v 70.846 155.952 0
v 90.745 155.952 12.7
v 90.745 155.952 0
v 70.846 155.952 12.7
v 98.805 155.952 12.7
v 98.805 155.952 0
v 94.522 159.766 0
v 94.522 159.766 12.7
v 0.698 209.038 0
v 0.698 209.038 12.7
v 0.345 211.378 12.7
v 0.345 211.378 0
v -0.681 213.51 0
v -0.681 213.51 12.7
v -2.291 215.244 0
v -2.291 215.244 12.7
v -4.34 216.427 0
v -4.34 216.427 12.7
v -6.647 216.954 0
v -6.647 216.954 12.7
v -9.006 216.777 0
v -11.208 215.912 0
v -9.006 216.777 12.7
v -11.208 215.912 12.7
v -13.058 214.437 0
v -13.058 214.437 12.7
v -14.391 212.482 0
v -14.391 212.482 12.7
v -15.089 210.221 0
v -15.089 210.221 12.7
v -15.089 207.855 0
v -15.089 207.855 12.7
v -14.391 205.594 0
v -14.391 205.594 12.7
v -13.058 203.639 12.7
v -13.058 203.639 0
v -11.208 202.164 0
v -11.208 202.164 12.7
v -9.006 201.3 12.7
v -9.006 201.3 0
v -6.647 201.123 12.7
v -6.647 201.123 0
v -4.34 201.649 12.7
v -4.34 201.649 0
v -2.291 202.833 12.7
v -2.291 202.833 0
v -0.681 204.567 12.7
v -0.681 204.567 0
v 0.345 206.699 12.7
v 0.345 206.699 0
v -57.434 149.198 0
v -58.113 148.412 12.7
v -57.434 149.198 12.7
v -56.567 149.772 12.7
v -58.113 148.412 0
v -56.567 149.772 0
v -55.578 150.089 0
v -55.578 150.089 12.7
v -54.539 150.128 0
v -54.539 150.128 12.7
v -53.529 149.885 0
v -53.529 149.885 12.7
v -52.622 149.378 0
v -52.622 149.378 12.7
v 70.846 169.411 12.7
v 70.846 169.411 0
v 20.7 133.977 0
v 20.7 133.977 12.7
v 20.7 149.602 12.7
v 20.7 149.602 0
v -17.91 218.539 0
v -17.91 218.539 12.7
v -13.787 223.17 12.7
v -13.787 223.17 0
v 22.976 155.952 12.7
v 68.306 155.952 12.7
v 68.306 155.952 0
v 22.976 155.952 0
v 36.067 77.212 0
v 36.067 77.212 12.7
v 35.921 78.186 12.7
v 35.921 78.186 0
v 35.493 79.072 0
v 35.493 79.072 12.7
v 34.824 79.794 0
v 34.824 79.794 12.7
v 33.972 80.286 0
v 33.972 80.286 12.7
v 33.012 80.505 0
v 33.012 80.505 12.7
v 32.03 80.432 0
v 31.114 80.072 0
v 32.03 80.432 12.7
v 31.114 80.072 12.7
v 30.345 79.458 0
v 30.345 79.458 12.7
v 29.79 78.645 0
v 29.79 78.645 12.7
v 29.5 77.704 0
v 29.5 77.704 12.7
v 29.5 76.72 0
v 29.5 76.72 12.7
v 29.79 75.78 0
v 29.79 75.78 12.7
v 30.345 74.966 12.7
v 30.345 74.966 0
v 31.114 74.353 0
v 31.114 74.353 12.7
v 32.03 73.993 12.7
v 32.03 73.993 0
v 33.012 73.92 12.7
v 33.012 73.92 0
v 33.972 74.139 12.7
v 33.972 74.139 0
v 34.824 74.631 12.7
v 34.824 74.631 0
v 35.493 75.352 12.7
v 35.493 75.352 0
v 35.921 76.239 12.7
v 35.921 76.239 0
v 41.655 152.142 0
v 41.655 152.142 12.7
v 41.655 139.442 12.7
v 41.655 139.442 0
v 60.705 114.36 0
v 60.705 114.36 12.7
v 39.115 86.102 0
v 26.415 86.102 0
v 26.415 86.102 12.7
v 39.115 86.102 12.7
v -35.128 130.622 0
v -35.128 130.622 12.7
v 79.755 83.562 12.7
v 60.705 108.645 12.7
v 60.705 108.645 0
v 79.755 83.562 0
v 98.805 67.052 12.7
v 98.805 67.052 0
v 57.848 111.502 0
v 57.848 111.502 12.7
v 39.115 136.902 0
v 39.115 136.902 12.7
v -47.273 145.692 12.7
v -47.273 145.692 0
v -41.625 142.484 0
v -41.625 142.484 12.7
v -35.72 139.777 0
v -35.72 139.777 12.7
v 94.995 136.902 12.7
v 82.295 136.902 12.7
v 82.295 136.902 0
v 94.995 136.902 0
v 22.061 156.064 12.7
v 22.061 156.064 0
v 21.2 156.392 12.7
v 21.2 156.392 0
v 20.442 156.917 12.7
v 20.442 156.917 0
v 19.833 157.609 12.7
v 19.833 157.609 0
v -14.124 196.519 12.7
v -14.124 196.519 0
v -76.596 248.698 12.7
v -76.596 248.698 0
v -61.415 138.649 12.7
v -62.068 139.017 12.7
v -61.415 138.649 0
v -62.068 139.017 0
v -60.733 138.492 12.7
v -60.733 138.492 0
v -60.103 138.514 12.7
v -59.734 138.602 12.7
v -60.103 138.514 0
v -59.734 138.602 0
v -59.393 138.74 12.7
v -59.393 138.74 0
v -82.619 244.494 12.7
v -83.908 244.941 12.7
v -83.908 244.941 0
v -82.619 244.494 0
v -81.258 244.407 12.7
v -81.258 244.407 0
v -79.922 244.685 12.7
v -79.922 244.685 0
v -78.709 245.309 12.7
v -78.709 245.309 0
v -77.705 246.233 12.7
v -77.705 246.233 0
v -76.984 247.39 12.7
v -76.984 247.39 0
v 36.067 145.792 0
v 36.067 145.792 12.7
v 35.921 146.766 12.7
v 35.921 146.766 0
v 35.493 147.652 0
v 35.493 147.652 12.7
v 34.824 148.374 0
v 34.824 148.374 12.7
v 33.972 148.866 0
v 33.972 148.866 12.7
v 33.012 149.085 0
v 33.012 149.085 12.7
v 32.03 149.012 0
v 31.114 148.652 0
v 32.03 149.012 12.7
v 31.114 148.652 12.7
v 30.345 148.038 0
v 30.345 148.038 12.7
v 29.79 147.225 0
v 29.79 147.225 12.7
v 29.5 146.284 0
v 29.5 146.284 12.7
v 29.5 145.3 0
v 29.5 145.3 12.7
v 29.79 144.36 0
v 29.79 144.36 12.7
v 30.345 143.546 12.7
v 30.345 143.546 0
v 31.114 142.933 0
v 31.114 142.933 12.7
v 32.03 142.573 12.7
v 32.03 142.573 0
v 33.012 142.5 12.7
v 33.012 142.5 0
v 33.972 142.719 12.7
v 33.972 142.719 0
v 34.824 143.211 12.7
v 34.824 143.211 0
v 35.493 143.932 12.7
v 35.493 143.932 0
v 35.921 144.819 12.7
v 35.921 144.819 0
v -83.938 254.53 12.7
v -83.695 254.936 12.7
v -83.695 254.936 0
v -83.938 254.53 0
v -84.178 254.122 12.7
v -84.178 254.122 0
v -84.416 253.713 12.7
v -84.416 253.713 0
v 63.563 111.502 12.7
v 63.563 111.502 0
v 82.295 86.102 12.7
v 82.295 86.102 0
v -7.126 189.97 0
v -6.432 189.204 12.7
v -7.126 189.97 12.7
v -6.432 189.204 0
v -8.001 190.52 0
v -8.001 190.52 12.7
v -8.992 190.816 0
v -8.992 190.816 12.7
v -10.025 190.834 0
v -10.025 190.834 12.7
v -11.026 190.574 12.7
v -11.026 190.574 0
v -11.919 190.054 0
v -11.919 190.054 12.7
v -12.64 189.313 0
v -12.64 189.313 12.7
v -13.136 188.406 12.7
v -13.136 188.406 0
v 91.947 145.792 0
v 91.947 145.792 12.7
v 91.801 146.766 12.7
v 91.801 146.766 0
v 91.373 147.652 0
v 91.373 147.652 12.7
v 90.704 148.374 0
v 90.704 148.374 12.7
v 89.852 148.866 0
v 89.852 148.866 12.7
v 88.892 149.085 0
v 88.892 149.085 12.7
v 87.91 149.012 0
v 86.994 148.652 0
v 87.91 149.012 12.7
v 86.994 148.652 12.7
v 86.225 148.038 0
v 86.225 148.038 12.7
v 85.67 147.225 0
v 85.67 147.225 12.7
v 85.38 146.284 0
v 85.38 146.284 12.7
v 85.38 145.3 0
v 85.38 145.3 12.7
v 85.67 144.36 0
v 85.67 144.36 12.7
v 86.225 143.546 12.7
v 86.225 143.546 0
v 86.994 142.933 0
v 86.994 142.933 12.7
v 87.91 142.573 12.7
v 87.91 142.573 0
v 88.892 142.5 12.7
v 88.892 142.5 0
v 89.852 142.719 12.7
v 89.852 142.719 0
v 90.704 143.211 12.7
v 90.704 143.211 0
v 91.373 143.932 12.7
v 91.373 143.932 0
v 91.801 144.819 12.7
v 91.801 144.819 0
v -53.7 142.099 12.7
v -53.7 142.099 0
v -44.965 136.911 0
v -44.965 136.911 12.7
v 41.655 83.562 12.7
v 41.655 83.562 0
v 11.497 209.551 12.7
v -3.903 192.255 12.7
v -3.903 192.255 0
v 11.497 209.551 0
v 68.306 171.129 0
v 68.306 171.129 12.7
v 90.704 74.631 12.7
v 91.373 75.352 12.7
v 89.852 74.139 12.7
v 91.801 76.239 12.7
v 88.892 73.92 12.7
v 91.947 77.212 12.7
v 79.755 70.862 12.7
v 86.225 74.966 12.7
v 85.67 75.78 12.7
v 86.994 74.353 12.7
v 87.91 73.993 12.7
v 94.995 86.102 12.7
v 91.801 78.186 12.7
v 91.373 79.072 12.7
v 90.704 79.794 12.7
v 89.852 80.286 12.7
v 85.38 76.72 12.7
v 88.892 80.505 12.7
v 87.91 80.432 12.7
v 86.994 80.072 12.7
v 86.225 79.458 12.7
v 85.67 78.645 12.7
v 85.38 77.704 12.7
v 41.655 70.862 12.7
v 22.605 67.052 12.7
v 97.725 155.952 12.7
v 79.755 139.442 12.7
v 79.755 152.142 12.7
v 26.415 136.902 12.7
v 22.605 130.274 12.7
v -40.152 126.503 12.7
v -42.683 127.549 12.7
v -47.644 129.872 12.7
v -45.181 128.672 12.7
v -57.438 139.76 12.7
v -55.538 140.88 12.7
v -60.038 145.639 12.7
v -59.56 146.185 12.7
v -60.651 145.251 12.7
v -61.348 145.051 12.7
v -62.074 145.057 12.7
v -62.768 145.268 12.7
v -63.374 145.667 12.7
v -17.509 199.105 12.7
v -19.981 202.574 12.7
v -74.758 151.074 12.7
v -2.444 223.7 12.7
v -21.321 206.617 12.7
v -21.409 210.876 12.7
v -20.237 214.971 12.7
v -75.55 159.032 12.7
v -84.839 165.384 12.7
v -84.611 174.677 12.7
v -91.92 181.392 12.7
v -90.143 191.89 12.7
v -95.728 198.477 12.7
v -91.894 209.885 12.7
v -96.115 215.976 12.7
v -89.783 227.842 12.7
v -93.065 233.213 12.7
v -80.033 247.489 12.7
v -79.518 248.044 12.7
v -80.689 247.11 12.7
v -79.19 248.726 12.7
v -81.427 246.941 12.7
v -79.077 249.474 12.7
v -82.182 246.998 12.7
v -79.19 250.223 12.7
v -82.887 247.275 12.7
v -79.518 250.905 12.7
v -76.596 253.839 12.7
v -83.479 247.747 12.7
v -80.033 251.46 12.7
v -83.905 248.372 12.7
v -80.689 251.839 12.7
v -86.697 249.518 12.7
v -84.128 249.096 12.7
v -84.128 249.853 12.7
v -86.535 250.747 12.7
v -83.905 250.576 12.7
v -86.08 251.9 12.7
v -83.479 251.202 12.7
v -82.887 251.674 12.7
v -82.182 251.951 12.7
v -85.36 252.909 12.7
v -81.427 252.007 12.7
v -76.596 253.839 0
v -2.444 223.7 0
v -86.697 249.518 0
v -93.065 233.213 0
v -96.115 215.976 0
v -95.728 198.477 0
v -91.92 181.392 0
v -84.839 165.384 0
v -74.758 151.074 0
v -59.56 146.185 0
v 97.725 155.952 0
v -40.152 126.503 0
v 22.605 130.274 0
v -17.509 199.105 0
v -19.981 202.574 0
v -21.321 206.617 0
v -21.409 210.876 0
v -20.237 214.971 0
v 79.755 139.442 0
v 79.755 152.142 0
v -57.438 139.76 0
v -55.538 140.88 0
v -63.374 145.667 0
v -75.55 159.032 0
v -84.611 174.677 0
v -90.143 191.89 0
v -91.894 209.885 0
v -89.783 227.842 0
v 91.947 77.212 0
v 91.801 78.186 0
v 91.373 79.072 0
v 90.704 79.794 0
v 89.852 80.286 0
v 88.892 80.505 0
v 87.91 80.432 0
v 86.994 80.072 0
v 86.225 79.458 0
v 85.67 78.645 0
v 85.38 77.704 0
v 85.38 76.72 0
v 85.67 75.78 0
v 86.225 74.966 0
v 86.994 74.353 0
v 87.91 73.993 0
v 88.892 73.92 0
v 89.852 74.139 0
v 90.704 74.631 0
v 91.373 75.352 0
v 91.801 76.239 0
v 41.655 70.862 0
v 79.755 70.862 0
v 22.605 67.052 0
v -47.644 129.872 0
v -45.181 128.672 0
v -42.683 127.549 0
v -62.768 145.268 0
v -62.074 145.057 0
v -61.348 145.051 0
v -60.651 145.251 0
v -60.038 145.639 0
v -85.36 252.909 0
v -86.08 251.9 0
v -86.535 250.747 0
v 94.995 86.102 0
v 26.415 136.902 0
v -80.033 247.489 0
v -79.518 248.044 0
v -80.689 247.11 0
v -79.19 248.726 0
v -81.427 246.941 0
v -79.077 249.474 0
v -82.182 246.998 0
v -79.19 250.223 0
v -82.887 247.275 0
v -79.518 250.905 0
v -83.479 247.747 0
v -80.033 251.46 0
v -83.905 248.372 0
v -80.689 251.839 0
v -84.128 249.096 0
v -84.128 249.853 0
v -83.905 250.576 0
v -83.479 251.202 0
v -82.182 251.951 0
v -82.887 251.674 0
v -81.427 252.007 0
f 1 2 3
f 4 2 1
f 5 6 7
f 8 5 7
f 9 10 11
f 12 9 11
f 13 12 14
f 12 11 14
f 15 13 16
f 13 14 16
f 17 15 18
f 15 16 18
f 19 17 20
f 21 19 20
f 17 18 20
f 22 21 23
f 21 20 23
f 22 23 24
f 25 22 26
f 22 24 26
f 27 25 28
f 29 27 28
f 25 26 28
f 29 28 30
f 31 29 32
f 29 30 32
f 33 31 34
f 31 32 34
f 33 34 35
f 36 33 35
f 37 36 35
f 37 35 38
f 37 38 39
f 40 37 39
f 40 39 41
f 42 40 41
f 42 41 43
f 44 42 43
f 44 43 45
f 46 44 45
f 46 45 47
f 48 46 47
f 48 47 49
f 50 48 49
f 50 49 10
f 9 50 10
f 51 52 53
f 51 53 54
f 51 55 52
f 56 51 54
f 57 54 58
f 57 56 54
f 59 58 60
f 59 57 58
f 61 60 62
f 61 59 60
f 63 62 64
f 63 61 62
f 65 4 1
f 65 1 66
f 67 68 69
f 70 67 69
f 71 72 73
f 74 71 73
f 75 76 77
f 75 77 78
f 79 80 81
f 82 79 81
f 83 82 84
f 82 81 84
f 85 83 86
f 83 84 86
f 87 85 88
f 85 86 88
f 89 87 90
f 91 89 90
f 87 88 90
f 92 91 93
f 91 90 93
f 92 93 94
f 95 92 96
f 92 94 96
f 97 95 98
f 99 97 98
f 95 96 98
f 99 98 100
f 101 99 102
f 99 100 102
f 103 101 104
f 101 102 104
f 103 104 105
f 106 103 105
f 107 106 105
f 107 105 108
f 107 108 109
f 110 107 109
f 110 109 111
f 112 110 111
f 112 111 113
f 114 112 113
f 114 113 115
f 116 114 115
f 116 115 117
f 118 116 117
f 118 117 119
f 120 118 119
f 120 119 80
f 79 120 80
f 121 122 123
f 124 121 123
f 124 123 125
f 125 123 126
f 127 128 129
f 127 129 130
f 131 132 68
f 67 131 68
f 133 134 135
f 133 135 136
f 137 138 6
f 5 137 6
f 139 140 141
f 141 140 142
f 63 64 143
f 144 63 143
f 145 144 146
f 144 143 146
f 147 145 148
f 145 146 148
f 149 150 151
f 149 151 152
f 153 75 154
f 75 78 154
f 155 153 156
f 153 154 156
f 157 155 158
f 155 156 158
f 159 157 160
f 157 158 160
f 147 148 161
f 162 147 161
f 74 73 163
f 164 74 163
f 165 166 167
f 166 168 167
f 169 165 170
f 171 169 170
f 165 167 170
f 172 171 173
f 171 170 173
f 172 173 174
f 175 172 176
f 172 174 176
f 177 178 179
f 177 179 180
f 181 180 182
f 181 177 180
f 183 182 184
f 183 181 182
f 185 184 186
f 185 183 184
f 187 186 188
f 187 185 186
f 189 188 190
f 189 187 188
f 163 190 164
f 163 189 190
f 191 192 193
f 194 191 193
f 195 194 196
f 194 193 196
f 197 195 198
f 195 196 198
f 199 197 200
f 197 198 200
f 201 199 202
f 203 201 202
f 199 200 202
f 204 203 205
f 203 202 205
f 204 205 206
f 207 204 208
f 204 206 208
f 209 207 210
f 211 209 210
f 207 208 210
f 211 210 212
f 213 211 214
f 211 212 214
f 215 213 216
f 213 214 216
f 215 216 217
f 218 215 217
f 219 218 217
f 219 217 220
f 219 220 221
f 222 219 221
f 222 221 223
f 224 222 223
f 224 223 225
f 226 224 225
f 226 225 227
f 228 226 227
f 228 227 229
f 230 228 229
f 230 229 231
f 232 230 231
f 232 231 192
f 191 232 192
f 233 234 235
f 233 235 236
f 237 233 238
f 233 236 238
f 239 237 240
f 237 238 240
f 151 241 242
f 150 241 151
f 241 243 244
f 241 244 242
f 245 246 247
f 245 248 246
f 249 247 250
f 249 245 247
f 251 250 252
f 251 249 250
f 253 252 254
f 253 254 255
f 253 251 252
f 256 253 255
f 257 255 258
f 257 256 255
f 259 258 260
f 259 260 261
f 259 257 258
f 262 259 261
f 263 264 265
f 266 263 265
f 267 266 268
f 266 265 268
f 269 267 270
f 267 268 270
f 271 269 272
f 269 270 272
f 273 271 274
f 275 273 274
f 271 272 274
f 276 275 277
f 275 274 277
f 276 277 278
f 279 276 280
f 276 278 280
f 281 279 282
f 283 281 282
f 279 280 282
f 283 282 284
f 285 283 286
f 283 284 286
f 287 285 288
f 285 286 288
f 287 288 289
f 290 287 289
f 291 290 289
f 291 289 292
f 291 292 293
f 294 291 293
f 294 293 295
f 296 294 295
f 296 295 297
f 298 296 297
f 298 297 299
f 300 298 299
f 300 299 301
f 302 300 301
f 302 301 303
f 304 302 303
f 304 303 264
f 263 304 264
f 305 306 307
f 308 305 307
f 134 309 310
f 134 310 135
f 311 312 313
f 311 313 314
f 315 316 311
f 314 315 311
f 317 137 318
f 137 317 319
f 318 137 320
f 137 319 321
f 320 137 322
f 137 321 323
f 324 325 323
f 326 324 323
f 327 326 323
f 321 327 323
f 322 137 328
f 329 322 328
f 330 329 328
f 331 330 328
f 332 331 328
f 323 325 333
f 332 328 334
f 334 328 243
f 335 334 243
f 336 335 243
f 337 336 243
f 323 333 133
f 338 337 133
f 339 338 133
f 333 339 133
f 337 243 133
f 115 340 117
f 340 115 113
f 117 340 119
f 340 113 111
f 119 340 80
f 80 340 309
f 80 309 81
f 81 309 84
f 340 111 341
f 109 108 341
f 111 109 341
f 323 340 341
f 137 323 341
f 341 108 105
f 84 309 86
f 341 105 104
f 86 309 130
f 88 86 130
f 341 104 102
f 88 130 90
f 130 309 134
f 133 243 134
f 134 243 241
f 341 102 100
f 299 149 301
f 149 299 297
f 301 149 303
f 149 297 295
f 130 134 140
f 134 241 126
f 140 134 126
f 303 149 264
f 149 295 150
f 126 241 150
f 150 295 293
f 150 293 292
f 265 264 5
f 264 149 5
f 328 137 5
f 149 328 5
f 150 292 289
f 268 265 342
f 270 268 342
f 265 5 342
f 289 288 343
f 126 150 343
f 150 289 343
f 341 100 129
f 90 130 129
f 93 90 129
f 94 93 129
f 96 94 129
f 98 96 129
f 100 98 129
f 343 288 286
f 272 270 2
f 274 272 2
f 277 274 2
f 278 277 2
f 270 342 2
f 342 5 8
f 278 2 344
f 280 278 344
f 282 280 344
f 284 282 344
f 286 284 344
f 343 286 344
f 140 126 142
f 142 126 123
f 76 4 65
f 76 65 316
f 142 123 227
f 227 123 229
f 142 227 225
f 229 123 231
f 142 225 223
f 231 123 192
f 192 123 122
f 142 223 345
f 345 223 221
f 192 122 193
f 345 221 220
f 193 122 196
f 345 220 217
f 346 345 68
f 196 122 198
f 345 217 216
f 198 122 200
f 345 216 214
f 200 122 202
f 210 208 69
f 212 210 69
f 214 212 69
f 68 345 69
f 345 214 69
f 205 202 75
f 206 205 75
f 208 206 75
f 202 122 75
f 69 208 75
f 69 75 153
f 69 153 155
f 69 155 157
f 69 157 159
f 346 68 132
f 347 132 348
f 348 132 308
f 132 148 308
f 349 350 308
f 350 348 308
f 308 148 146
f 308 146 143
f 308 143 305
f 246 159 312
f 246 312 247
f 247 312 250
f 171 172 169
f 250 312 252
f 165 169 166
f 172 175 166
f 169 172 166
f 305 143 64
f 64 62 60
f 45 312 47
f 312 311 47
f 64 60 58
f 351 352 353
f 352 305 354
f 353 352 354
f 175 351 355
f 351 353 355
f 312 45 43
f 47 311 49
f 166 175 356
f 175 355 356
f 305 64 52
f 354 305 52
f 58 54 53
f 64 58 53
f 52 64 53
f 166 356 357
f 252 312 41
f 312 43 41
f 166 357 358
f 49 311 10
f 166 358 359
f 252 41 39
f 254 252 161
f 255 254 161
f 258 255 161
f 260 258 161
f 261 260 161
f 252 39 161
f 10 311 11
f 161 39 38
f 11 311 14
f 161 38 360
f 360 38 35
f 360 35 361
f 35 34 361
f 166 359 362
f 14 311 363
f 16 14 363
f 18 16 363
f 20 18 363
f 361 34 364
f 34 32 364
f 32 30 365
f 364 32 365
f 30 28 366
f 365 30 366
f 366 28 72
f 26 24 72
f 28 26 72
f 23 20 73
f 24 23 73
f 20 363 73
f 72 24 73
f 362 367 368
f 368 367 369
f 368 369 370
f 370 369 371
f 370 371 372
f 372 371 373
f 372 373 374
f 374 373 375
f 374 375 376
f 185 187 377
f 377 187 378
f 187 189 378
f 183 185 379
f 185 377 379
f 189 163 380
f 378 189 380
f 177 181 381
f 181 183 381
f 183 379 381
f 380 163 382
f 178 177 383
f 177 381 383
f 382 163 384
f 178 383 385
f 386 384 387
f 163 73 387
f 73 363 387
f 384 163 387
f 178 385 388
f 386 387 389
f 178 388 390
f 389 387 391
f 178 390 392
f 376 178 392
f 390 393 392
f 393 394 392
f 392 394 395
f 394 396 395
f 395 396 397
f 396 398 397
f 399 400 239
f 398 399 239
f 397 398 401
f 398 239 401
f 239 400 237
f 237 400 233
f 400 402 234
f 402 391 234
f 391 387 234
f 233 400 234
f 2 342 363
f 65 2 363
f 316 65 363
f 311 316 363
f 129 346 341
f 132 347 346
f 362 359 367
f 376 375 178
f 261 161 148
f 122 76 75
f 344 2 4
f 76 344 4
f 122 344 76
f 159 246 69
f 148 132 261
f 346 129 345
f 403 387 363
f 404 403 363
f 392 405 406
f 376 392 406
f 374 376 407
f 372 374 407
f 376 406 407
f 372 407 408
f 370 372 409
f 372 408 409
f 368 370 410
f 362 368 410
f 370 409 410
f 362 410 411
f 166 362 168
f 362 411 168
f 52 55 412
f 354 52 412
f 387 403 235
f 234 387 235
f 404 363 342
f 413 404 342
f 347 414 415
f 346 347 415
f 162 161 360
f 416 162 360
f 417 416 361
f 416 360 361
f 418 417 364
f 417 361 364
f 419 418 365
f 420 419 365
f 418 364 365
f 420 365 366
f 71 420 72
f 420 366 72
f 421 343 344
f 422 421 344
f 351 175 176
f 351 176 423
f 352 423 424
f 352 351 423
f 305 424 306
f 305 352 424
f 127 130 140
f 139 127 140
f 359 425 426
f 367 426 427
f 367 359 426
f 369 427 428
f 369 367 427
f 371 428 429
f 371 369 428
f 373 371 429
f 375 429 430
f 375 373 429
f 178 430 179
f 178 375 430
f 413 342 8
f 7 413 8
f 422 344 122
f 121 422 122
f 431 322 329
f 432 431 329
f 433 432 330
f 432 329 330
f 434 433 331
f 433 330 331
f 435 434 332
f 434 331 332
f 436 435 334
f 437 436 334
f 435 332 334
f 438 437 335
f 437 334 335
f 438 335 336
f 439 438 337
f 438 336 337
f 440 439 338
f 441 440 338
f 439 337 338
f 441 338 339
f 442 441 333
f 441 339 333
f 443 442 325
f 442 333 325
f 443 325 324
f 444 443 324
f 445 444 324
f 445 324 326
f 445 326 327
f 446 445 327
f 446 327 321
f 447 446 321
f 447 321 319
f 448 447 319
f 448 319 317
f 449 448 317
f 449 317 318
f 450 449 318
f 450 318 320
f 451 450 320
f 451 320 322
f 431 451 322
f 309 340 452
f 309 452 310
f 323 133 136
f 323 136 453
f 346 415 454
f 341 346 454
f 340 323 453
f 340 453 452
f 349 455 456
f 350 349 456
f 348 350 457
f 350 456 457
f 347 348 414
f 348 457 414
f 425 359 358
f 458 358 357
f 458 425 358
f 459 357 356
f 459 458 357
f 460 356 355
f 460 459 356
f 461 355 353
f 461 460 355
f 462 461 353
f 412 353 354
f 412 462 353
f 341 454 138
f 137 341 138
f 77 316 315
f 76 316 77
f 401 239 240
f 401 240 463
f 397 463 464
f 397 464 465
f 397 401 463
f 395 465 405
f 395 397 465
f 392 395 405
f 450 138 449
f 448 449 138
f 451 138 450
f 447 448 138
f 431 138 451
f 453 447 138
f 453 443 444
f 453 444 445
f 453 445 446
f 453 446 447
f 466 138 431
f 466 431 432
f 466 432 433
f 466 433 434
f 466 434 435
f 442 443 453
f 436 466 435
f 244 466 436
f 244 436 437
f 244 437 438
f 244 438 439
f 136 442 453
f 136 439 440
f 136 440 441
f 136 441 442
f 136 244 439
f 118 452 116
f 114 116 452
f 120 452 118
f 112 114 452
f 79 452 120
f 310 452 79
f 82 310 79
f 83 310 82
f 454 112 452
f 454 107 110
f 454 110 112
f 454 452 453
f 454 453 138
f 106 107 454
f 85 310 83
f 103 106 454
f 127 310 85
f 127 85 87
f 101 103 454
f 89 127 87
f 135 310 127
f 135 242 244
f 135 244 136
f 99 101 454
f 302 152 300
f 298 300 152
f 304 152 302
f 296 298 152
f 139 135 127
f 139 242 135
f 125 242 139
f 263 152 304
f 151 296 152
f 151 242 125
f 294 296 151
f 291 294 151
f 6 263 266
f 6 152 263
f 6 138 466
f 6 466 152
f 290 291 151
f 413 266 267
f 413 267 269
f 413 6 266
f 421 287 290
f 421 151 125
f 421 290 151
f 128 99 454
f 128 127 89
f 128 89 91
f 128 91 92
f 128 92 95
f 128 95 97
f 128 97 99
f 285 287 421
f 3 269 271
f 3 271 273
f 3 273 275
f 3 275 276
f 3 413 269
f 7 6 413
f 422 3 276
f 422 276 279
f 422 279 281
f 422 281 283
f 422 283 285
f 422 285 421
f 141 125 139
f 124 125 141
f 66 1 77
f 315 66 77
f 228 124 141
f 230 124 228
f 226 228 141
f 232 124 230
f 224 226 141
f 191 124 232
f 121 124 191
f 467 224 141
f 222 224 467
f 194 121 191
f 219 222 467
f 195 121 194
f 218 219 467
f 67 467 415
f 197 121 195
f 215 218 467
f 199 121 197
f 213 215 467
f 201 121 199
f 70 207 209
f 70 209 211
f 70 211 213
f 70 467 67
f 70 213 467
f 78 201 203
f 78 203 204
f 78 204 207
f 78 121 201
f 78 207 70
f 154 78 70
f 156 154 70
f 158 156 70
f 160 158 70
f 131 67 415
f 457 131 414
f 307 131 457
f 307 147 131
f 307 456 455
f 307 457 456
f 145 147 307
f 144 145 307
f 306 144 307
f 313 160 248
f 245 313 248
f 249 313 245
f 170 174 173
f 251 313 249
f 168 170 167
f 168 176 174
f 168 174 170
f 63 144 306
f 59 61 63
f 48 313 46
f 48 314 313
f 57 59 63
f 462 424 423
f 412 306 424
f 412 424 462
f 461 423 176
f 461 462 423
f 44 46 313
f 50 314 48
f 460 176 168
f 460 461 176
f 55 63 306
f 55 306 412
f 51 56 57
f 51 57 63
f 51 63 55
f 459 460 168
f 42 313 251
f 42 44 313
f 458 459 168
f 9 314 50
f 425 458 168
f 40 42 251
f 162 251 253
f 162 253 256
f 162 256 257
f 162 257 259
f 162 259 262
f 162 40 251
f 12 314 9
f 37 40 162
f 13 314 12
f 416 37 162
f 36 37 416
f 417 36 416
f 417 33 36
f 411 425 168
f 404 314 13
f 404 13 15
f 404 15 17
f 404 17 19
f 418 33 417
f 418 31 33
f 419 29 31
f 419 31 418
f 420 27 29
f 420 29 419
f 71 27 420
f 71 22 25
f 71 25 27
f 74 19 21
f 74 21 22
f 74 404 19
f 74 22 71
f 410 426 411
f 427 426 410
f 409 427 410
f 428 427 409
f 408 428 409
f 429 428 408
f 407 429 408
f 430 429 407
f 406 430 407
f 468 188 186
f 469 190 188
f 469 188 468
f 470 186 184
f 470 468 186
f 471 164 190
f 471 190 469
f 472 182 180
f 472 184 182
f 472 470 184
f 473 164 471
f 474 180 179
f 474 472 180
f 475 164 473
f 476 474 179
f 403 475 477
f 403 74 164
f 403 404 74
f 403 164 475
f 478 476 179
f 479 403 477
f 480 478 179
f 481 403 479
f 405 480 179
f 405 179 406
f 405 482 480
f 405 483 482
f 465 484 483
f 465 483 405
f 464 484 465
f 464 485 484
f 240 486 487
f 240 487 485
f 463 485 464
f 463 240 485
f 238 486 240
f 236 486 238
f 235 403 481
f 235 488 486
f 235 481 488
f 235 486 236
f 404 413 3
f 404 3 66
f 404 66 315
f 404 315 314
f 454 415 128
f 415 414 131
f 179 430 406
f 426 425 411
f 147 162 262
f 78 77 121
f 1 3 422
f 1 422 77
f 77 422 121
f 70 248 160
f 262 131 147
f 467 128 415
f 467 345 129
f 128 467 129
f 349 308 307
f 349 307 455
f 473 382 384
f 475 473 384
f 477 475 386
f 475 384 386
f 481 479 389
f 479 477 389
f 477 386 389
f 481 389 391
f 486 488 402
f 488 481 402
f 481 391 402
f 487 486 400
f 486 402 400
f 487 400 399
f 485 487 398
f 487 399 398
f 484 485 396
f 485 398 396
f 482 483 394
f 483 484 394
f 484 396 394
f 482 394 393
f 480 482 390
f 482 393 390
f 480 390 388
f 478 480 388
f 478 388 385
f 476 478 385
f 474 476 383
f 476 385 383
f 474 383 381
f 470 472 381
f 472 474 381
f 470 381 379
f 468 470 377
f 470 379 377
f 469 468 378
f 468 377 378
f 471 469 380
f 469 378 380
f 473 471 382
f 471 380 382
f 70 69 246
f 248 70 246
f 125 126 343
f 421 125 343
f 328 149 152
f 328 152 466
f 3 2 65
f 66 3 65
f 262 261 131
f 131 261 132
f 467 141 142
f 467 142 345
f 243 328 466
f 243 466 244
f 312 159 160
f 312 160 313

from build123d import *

# Parameters (mm, degrees)
BOSS_EXTRUDE1_DEPTH = 12.7
SKETCH2_R           = 7.9375
CUT_EXTRUDE1_DEPTH  = 25.4
CUT_EXTRUDE2_DEPTH  = 15.24
CUT_EXTRUDE4_DEPTH  = 12.7
CUT_EXTRUDE3_DEPTH  = 12.7
FILLET4_R           = 3.81
CUT_EXTRUDE8_REACH  = 306.459
SKETCH10_R          = 3.302
CUT_EXTRUDE9_DEPTH  = 12.7
CUT_EXTRUDE10_DEPTH = 15.24
FILLET8_R           = 2.54
FILLET9_R           = 3.81
CUT_EXTRUDE11_DEPTH = 12.7
BOSS_EXTRUDE2_DEPTH = 12.7
SKETCH16_R          = 5.08
SKETCH16_R_2        = 2.54
BOSS_EXTRUDE3_DEPTH = 12.7
SKETCH17_R          = 2.54
CUT_EXTRUDE12_DEPTH = 12.7
CUT_EXTRUDE13_DEPTH = 12.7
BOSS_EXTRUDE4_DEPTH = 12.7


with BuildPart() as part:
    # Sketch1 → Boss-Extrude1 (new body)
    with BuildSketch(Plane.XY):
        with BuildLine():
            Line((22.605250022, 67.052290313), (98.805250022, 67.052290313))
            Line((98.805250022, 67.052290313), (98.805250022, 155.952290313))
            Line((98.805250022, 155.952290313), (-49.161223166, 287.699993186))
            ThreePointArc((-49.161223166, 287.699993186), (-96.236474745, 204.218681994), (-40.152034083, 126.502891159))
            Line((-40.152034083, 126.502891159), (22.605250022, 130.274128502))
            Line((22.605250022, 130.274128502), (22.605250022, 67.052290313))
        make_face()
    extrude(amount=BOSS_EXTRUDE1_DEPTH)

    # Sketch2 → Cut-Extrude1 (cut)
    with BuildSketch(Plane.XY.offset(12.7)):
        with Locations((-7.239749978, 209.038290313)):
            Circle(SKETCH2_R)
    extrude(amount=-CUT_EXTRUDE1_DEPTH, mode=Mode.SUBTRACT)

    # Sketch3 → Cut-Extrude2 (cut)
    with BuildSketch(Plane.XY.offset(12.7)):
        Polygon((41.655250022, 70.862290313), (41.655250022, 83.562290313), (60.705250022, 108.644790313), (79.755250022, 83.562290313), (79.755250022, 70.862290313), align=None)
        Polygon((26.415250022, 86.102290313), (39.115250022, 86.102290313), (57.847750022, 111.502290313), (39.115250022, 136.902290313), (26.415250022, 136.902290313), align=None)
        Polygon((94.995250022, 86.102290313), (82.295250022, 86.102290313), (63.562750022, 111.502290313), (82.295250022, 136.902290313), (94.995250022, 136.902290313), align=None)
        Polygon((41.655250022, 152.142290313), (41.655250022, 139.442290313), (60.705250022, 114.359790313), (79.755250022, 139.442290313), (79.755250022, 152.142290313), align=None)
    extrude(amount=-CUT_EXTRUDE2_DEPTH, mode=Mode.SUBTRACT)

    # Sketch5 → Cut-Extrude4 (cut)
    with BuildSketch(Plane.XY.offset(12.7)):
        with BuildLine():
            Line((-17.910409102, 218.539326578), (-0.75941726, 237.80168728))
            Line((-0.75941726, 237.80168728), (-42.818220106, 275.250377791))
            ThreePointArc((-42.818220106, 275.250377791), (-82.302366375, 205.259118271), (-35.720460653, 139.777057558))
            Line((-35.720460653, 139.777057558), (-14.124378137, 196.518923262))
            ThreePointArc((-14.124378137, 196.518923262), (-21.320643715, 206.617321953), (-17.910409102, 218.539326578))
        make_face()
        with BuildLine():
            Line((3.983097906, 233.579004496), (-5.26797782, 223.189077245))
            ThreePointArc((-5.26797782, 223.189077245), (1.977645927, 219.954895508), (6.380422315, 213.353792944))
            Line((6.380422315, 213.353792944), (15.365134305, 223.444565813))
            Line((15.365134305, 223.444565813), (3.983097906, 233.579004496))
        make_face()
        Polygon((20.700250022, 133.976525379), (20.700250022, 149.602290313), (-10.546123475, 195.20949671), (-35.128405597, 130.621646119), align=None)
    extrude(amount=-CUT_EXTRUDE4_DEPTH, mode=Mode.SUBTRACT)

    # Sketch4 → Cut-Extrude3 (cut)
    with BuildSketch(Plane.XY.offset(12.7)):
        Polygon((20.968161353, 155.952290313), (-3.903453401, 192.254898923), (20.952186028, 220.170386062), (68.306030681, 178.007049188), (68.306030681, 155.952290313), align=None)
        Polygon((91.166030681, 155.952290313), (70.846030681, 155.952290313), (70.846030681, 174.044992428), align=None)
    extrude(amount=-CUT_EXTRUDE3_DEPTH, mode=Mode.SUBTRACT)

    # Fillet4
    fillet4_edges = [part.edges().sort_by_distance(p)[0] for p in [
        (-10.546123475, 195.20949671, 6.35),
        (20.968161353, 155.952290313, 6.35),
    ]]
    fillet(fillet4_edges, radius=FILLET4_R)

    # Sketch10 → Cut-Extrude8 (cut, up to next)
    with BuildSketch(Plane.XY.offset(12.7), mode=Mode.PRIVATE) as cut_extrude8_sk1:
        with Locations((32.765250022, 77.212290313)):
            Circle(SKETCH10_R)
    cut_extrude8_tool1 = extrude(cut_extrude8_sk1.sketch, amount=-CUT_EXTRUDE8_REACH, mode=Mode.PRIVATE) & part.part
    # Sketch10 → Cut-Extrude8 (cut, up to next)
    with BuildSketch(Plane.XY.offset(12.7), mode=Mode.PRIVATE) as cut_extrude8_sk2:
        with Locations((32.765250022, 145.792290313)):
            Circle(SKETCH10_R)
    cut_extrude8_tool2 = extrude(cut_extrude8_sk2.sketch, amount=-CUT_EXTRUDE8_REACH, mode=Mode.PRIVATE) & part.part
    # Sketch10 → Cut-Extrude8 (cut, up to next)
    with BuildSketch(Plane.XY.offset(12.7), mode=Mode.PRIVATE) as cut_extrude8_sk3:
        with Locations((88.645250022, 145.792290313)):
            Circle(SKETCH10_R)
    cut_extrude8_tool3 = extrude(cut_extrude8_sk3.sketch, amount=-CUT_EXTRUDE8_REACH, mode=Mode.PRIVATE) & part.part
    # Sketch10 → Cut-Extrude8 (cut, up to next)
    with BuildSketch(Plane.XY.offset(12.7), mode=Mode.PRIVATE) as cut_extrude8_sk4:
        with Locations((88.645250022, 77.212290313)):
            Circle(SKETCH10_R)
    cut_extrude8_tool4 = extrude(cut_extrude8_sk4.sketch, amount=-CUT_EXTRUDE8_REACH, mode=Mode.PRIVATE) & part.part
    add(cut_extrude8_tool1.solids().sort_by_distance((32.76525, 77.21229, 12.7))[0], mode=Mode.SUBTRACT)
    add(cut_extrude8_tool2.solids().sort_by_distance((32.76525, 145.79229, 12.7))[0], mode=Mode.SUBTRACT)
    add(cut_extrude8_tool3.solids().sort_by_distance((88.64525, 145.79229, 12.7))[0], mode=Mode.SUBTRACT)
    add(cut_extrude8_tool4.solids().sort_by_distance((88.64525, 77.21229, 12.7))[0], mode=Mode.SUBTRACT)

    # Sketch11 → Cut-Extrude9 (cut)
    with BuildSketch(Plane.XY.offset(12.7)):
        with BuildLine():
            Line((-53.699981311, 142.099051734), (-44.964720503, 136.910524137))
            Line((-44.964720503, 136.910524137), (-50.020521881, 123.626837035))
            Line((-50.020521881, 123.626837035), (-66.867730014, 134.987909964))
            ThreePointArc((-66.867730014, 134.987909964), (-63.911601381, 136.652385518), (-60.829717039, 138.070540751))
            ThreePointArc((-60.829717039, 138.070540751), (-57.16682096, 139.911304034), (-53.699981311, 142.099051734))
        make_face()
    extrude(amount=-CUT_EXTRUDE9_DEPTH, mode=Mode.SUBTRACT)

    # Sketch13 → Cut-Extrude10 (cut)
    with BuildSketch(Plane.XY.offset(12.7)):
        with BuildLine():
            Line((-50.310364079, 281.9212995), (-42.818220106, 275.250377791))
            Line((-42.818220106, 275.250377791), (-55.824588323, 151.935966869))
            Line((-55.824588323, 151.935966869), (-61.138010202, 143.754384394))
            ThreePointArc((-61.138010202, 143.754384394), (-91.639185725, 215.652371712), (-50.310364079, 281.9212995))
        make_face()
    extrude(amount=-CUT_EXTRUDE10_DEPTH, mode=Mode.SUBTRACT)

    # Fillet8
    fillet8_edges = [part.edges().sort_by_distance(p)[0] for p in [
        (-60.829717039, 138.070540751, 6.35),
        (-61.138010202, 143.754384394, 6.35),
    ]]
    fillet(fillet8_edges, radius=FILLET8_R)

    # Fillet9
    fillet9_edges = [part.edges().sort_by_distance(p)[0] for p in [
        (-55.824588323, 151.935966869, 6.35),
    ]]
    fillet(fillet9_edges, radius=FILLET9_R)

    # Sketch14 → Cut-Extrude11 (cut)
    with BuildSketch(Plane.XY.offset(12.7)):
        Polygon((-0.75941726, 237.80168728), (-90.284904, 256.297301642), (-56.503441725, 294.237422972), (2.618728967, 241.595699413), align=None)
    extrude(amount=-CUT_EXTRUDE11_DEPTH, mode=Mode.SUBTRACT)

    # Sketch15 → Boss-Extrude2 (add)
    with BuildSketch(Plane.XY.offset(12.7)):
        Polygon((2.618728967, 241.595699413), (-83.695447283, 254.935945734), (-84.471371658, 249.915553183), (-1.404499457, 237.07719239), align=None)
    extrude(amount=-BOSS_EXTRUDE2_DEPTH)

    # Sketch16 → Boss-Extrude3 (add)
    with BuildSketch(Plane.XY.offset(12.7)):
        with Locations((-81.616731922, 249.474355701)):
            Circle(SKETCH16_R)
        with Locations((-81.616731922, 249.474355701)):
            Circle(SKETCH16_R_2, mode=Mode.SUBTRACT)
    extrude(amount=-BOSS_EXTRUDE3_DEPTH)

    # Sketch17 → Cut-Extrude12 (cut)
    with BuildSketch(Plane.XY.offset(12.7)):
        with Locations((-81.616731922, 249.474355701)):
            Circle(SKETCH17_R)
    extrude(amount=-CUT_EXTRUDE12_DEPTH, mode=Mode.SUBTRACT)

    # Sketch18 → Cut-Extrude13 (cut)
    with BuildSketch(Plane.XY.offset(12.7)):
        Polygon((-76.596339371, 248.698431326), (1.977645927, 219.954895508), (91.166030681, 155.952290313), (97.725254163, 155.952290313), (11.18255191, 258.990487802), (-76.596339371, 256.904187462), align=None)
    extrude(amount=-CUT_EXTRUDE13_DEPTH, mode=Mode.SUBTRACT)

    # Sketch20 → Boss-Extrude4 (add)
    with BuildSketch(Plane.XY.offset(12.7)):
        Polygon((90.745298735, 155.952290313), (-0.889749978, 217.928290313), (-76.596339371, 248.698431326), (-76.596339371, 253.838746498), (-2.444151583, 223.700375546), (97.725254163, 155.952290313), align=None)
    extrude(amount=-BOSS_EXTRUDE4_DEPTH)


solid = part.part
